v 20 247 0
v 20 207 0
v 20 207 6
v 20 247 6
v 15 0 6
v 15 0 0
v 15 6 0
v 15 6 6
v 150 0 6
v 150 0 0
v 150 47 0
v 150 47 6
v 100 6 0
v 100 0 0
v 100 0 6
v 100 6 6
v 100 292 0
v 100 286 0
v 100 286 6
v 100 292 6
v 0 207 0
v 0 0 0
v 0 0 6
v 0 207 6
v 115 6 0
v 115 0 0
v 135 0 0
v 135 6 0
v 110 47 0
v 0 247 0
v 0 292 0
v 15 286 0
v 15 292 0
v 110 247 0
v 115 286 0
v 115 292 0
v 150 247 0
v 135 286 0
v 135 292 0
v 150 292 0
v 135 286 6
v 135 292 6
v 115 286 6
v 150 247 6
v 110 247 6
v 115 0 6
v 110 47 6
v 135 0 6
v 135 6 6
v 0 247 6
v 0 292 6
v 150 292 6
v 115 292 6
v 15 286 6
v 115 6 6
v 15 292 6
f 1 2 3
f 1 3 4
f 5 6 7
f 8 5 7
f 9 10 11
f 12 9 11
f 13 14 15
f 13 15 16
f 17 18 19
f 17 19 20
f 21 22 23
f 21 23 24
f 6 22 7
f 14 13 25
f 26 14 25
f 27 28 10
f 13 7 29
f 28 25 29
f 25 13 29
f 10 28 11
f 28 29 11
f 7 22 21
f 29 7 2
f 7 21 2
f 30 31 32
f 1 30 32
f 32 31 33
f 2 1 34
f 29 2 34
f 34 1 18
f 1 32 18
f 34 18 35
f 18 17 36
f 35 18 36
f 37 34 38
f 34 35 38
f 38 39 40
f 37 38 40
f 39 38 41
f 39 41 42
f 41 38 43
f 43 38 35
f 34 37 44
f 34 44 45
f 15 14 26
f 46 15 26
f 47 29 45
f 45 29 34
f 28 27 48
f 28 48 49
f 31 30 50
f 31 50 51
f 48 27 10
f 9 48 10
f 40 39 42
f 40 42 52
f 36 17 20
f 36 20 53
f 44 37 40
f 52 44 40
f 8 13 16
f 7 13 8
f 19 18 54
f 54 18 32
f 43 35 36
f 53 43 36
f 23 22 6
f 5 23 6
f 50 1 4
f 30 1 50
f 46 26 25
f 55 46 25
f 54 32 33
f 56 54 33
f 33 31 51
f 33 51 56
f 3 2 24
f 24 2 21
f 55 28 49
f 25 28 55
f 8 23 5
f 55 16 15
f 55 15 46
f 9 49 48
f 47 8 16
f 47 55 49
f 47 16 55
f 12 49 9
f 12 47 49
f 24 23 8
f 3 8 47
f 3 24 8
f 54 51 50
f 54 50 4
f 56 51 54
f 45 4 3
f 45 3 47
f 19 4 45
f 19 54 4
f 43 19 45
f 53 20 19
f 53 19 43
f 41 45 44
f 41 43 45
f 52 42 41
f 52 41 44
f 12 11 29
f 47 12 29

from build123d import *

# Parameters (mm, degrees)
ESBO_O1_W                = 150
ESBO_O1_H                = 292
RESSALTO_EXTRUS_O1_DEPTH = 6
ESBO_O2_W                = 40
ESBO_O2_H                = 200
CORTE_EXTRUS_O1_DEPTH    = 329.329103188
ESBO_O5_W                = 20
ESBO_O5_H                = 6
ESBO_O5_W_2              = 85
CORTE_EXTRUS_O2_DEPTH    = 329.329103188
ESBO_O7_W                = 20
ESBO_O7_H                = 40
CORTE_EXTRUS_O3_DEPTH    = 329.329103188


with BuildPart() as part:
    # Esboço1 → Ressalto-extrusão1 (new body)
    with BuildSketch(Plane.XY):
        with Locations((75, 146)):
            Rectangle(ESBO_O1_W, ESBO_O1_H)
    extrude(amount=RESSALTO_EXTRUS_O1_DEPTH)

    # Esboço2 → Corte-extrusão1 (cut, through all)
    with BuildSketch(Plane(origin=(0, 0, 0), x_dir=(-1, 0, 0), z_dir=(0, 0, -1))):
        with Locations((-130, 147)):
            Rectangle(ESBO_O2_W, ESBO_O2_H)
    extrude(amount=-CORTE_EXTRUS_O1_DEPTH, mode=Mode.SUBTRACT)

    # Esboço5 → Corte-extrusão2 (cut, through all)
    with BuildSketch(Plane(origin=(0, 0, 0), x_dir=(-1, 0, 0), z_dir=(0, 0, -1))):
        with Locations((-125, 289)):
            Rectangle(ESBO_O5_W, ESBO_O5_H)
        with Locations((-57.5, 289)):
            Rectangle(ESBO_O5_W_2, ESBO_O5_H)
        with Locations((-125, 3)):
            Rectangle(ESBO_O5_W, ESBO_O5_H)
        with Locations((-57.5, 3)):
            Rectangle(ESBO_O5_W_2, ESBO_O5_H)
    extrude(amount=-CORTE_EXTRUS_O2_DEPTH, mode=Mode.SUBTRACT)

    # Esboço7 → Corte-extrusão3 (cut, through all)
    with BuildSketch(Plane(origin=(0, 0, 0), x_dir=(-1, 0, 0), z_dir=(0, 0, -1))):
        with Locations((-10, 227)):
            Rectangle(ESBO_O7_W, ESBO_O7_H)
    extrude(amount=-CORTE_EXTRUS_O3_DEPTH, mode=Mode.SUBTRACT)


solid = part.part
